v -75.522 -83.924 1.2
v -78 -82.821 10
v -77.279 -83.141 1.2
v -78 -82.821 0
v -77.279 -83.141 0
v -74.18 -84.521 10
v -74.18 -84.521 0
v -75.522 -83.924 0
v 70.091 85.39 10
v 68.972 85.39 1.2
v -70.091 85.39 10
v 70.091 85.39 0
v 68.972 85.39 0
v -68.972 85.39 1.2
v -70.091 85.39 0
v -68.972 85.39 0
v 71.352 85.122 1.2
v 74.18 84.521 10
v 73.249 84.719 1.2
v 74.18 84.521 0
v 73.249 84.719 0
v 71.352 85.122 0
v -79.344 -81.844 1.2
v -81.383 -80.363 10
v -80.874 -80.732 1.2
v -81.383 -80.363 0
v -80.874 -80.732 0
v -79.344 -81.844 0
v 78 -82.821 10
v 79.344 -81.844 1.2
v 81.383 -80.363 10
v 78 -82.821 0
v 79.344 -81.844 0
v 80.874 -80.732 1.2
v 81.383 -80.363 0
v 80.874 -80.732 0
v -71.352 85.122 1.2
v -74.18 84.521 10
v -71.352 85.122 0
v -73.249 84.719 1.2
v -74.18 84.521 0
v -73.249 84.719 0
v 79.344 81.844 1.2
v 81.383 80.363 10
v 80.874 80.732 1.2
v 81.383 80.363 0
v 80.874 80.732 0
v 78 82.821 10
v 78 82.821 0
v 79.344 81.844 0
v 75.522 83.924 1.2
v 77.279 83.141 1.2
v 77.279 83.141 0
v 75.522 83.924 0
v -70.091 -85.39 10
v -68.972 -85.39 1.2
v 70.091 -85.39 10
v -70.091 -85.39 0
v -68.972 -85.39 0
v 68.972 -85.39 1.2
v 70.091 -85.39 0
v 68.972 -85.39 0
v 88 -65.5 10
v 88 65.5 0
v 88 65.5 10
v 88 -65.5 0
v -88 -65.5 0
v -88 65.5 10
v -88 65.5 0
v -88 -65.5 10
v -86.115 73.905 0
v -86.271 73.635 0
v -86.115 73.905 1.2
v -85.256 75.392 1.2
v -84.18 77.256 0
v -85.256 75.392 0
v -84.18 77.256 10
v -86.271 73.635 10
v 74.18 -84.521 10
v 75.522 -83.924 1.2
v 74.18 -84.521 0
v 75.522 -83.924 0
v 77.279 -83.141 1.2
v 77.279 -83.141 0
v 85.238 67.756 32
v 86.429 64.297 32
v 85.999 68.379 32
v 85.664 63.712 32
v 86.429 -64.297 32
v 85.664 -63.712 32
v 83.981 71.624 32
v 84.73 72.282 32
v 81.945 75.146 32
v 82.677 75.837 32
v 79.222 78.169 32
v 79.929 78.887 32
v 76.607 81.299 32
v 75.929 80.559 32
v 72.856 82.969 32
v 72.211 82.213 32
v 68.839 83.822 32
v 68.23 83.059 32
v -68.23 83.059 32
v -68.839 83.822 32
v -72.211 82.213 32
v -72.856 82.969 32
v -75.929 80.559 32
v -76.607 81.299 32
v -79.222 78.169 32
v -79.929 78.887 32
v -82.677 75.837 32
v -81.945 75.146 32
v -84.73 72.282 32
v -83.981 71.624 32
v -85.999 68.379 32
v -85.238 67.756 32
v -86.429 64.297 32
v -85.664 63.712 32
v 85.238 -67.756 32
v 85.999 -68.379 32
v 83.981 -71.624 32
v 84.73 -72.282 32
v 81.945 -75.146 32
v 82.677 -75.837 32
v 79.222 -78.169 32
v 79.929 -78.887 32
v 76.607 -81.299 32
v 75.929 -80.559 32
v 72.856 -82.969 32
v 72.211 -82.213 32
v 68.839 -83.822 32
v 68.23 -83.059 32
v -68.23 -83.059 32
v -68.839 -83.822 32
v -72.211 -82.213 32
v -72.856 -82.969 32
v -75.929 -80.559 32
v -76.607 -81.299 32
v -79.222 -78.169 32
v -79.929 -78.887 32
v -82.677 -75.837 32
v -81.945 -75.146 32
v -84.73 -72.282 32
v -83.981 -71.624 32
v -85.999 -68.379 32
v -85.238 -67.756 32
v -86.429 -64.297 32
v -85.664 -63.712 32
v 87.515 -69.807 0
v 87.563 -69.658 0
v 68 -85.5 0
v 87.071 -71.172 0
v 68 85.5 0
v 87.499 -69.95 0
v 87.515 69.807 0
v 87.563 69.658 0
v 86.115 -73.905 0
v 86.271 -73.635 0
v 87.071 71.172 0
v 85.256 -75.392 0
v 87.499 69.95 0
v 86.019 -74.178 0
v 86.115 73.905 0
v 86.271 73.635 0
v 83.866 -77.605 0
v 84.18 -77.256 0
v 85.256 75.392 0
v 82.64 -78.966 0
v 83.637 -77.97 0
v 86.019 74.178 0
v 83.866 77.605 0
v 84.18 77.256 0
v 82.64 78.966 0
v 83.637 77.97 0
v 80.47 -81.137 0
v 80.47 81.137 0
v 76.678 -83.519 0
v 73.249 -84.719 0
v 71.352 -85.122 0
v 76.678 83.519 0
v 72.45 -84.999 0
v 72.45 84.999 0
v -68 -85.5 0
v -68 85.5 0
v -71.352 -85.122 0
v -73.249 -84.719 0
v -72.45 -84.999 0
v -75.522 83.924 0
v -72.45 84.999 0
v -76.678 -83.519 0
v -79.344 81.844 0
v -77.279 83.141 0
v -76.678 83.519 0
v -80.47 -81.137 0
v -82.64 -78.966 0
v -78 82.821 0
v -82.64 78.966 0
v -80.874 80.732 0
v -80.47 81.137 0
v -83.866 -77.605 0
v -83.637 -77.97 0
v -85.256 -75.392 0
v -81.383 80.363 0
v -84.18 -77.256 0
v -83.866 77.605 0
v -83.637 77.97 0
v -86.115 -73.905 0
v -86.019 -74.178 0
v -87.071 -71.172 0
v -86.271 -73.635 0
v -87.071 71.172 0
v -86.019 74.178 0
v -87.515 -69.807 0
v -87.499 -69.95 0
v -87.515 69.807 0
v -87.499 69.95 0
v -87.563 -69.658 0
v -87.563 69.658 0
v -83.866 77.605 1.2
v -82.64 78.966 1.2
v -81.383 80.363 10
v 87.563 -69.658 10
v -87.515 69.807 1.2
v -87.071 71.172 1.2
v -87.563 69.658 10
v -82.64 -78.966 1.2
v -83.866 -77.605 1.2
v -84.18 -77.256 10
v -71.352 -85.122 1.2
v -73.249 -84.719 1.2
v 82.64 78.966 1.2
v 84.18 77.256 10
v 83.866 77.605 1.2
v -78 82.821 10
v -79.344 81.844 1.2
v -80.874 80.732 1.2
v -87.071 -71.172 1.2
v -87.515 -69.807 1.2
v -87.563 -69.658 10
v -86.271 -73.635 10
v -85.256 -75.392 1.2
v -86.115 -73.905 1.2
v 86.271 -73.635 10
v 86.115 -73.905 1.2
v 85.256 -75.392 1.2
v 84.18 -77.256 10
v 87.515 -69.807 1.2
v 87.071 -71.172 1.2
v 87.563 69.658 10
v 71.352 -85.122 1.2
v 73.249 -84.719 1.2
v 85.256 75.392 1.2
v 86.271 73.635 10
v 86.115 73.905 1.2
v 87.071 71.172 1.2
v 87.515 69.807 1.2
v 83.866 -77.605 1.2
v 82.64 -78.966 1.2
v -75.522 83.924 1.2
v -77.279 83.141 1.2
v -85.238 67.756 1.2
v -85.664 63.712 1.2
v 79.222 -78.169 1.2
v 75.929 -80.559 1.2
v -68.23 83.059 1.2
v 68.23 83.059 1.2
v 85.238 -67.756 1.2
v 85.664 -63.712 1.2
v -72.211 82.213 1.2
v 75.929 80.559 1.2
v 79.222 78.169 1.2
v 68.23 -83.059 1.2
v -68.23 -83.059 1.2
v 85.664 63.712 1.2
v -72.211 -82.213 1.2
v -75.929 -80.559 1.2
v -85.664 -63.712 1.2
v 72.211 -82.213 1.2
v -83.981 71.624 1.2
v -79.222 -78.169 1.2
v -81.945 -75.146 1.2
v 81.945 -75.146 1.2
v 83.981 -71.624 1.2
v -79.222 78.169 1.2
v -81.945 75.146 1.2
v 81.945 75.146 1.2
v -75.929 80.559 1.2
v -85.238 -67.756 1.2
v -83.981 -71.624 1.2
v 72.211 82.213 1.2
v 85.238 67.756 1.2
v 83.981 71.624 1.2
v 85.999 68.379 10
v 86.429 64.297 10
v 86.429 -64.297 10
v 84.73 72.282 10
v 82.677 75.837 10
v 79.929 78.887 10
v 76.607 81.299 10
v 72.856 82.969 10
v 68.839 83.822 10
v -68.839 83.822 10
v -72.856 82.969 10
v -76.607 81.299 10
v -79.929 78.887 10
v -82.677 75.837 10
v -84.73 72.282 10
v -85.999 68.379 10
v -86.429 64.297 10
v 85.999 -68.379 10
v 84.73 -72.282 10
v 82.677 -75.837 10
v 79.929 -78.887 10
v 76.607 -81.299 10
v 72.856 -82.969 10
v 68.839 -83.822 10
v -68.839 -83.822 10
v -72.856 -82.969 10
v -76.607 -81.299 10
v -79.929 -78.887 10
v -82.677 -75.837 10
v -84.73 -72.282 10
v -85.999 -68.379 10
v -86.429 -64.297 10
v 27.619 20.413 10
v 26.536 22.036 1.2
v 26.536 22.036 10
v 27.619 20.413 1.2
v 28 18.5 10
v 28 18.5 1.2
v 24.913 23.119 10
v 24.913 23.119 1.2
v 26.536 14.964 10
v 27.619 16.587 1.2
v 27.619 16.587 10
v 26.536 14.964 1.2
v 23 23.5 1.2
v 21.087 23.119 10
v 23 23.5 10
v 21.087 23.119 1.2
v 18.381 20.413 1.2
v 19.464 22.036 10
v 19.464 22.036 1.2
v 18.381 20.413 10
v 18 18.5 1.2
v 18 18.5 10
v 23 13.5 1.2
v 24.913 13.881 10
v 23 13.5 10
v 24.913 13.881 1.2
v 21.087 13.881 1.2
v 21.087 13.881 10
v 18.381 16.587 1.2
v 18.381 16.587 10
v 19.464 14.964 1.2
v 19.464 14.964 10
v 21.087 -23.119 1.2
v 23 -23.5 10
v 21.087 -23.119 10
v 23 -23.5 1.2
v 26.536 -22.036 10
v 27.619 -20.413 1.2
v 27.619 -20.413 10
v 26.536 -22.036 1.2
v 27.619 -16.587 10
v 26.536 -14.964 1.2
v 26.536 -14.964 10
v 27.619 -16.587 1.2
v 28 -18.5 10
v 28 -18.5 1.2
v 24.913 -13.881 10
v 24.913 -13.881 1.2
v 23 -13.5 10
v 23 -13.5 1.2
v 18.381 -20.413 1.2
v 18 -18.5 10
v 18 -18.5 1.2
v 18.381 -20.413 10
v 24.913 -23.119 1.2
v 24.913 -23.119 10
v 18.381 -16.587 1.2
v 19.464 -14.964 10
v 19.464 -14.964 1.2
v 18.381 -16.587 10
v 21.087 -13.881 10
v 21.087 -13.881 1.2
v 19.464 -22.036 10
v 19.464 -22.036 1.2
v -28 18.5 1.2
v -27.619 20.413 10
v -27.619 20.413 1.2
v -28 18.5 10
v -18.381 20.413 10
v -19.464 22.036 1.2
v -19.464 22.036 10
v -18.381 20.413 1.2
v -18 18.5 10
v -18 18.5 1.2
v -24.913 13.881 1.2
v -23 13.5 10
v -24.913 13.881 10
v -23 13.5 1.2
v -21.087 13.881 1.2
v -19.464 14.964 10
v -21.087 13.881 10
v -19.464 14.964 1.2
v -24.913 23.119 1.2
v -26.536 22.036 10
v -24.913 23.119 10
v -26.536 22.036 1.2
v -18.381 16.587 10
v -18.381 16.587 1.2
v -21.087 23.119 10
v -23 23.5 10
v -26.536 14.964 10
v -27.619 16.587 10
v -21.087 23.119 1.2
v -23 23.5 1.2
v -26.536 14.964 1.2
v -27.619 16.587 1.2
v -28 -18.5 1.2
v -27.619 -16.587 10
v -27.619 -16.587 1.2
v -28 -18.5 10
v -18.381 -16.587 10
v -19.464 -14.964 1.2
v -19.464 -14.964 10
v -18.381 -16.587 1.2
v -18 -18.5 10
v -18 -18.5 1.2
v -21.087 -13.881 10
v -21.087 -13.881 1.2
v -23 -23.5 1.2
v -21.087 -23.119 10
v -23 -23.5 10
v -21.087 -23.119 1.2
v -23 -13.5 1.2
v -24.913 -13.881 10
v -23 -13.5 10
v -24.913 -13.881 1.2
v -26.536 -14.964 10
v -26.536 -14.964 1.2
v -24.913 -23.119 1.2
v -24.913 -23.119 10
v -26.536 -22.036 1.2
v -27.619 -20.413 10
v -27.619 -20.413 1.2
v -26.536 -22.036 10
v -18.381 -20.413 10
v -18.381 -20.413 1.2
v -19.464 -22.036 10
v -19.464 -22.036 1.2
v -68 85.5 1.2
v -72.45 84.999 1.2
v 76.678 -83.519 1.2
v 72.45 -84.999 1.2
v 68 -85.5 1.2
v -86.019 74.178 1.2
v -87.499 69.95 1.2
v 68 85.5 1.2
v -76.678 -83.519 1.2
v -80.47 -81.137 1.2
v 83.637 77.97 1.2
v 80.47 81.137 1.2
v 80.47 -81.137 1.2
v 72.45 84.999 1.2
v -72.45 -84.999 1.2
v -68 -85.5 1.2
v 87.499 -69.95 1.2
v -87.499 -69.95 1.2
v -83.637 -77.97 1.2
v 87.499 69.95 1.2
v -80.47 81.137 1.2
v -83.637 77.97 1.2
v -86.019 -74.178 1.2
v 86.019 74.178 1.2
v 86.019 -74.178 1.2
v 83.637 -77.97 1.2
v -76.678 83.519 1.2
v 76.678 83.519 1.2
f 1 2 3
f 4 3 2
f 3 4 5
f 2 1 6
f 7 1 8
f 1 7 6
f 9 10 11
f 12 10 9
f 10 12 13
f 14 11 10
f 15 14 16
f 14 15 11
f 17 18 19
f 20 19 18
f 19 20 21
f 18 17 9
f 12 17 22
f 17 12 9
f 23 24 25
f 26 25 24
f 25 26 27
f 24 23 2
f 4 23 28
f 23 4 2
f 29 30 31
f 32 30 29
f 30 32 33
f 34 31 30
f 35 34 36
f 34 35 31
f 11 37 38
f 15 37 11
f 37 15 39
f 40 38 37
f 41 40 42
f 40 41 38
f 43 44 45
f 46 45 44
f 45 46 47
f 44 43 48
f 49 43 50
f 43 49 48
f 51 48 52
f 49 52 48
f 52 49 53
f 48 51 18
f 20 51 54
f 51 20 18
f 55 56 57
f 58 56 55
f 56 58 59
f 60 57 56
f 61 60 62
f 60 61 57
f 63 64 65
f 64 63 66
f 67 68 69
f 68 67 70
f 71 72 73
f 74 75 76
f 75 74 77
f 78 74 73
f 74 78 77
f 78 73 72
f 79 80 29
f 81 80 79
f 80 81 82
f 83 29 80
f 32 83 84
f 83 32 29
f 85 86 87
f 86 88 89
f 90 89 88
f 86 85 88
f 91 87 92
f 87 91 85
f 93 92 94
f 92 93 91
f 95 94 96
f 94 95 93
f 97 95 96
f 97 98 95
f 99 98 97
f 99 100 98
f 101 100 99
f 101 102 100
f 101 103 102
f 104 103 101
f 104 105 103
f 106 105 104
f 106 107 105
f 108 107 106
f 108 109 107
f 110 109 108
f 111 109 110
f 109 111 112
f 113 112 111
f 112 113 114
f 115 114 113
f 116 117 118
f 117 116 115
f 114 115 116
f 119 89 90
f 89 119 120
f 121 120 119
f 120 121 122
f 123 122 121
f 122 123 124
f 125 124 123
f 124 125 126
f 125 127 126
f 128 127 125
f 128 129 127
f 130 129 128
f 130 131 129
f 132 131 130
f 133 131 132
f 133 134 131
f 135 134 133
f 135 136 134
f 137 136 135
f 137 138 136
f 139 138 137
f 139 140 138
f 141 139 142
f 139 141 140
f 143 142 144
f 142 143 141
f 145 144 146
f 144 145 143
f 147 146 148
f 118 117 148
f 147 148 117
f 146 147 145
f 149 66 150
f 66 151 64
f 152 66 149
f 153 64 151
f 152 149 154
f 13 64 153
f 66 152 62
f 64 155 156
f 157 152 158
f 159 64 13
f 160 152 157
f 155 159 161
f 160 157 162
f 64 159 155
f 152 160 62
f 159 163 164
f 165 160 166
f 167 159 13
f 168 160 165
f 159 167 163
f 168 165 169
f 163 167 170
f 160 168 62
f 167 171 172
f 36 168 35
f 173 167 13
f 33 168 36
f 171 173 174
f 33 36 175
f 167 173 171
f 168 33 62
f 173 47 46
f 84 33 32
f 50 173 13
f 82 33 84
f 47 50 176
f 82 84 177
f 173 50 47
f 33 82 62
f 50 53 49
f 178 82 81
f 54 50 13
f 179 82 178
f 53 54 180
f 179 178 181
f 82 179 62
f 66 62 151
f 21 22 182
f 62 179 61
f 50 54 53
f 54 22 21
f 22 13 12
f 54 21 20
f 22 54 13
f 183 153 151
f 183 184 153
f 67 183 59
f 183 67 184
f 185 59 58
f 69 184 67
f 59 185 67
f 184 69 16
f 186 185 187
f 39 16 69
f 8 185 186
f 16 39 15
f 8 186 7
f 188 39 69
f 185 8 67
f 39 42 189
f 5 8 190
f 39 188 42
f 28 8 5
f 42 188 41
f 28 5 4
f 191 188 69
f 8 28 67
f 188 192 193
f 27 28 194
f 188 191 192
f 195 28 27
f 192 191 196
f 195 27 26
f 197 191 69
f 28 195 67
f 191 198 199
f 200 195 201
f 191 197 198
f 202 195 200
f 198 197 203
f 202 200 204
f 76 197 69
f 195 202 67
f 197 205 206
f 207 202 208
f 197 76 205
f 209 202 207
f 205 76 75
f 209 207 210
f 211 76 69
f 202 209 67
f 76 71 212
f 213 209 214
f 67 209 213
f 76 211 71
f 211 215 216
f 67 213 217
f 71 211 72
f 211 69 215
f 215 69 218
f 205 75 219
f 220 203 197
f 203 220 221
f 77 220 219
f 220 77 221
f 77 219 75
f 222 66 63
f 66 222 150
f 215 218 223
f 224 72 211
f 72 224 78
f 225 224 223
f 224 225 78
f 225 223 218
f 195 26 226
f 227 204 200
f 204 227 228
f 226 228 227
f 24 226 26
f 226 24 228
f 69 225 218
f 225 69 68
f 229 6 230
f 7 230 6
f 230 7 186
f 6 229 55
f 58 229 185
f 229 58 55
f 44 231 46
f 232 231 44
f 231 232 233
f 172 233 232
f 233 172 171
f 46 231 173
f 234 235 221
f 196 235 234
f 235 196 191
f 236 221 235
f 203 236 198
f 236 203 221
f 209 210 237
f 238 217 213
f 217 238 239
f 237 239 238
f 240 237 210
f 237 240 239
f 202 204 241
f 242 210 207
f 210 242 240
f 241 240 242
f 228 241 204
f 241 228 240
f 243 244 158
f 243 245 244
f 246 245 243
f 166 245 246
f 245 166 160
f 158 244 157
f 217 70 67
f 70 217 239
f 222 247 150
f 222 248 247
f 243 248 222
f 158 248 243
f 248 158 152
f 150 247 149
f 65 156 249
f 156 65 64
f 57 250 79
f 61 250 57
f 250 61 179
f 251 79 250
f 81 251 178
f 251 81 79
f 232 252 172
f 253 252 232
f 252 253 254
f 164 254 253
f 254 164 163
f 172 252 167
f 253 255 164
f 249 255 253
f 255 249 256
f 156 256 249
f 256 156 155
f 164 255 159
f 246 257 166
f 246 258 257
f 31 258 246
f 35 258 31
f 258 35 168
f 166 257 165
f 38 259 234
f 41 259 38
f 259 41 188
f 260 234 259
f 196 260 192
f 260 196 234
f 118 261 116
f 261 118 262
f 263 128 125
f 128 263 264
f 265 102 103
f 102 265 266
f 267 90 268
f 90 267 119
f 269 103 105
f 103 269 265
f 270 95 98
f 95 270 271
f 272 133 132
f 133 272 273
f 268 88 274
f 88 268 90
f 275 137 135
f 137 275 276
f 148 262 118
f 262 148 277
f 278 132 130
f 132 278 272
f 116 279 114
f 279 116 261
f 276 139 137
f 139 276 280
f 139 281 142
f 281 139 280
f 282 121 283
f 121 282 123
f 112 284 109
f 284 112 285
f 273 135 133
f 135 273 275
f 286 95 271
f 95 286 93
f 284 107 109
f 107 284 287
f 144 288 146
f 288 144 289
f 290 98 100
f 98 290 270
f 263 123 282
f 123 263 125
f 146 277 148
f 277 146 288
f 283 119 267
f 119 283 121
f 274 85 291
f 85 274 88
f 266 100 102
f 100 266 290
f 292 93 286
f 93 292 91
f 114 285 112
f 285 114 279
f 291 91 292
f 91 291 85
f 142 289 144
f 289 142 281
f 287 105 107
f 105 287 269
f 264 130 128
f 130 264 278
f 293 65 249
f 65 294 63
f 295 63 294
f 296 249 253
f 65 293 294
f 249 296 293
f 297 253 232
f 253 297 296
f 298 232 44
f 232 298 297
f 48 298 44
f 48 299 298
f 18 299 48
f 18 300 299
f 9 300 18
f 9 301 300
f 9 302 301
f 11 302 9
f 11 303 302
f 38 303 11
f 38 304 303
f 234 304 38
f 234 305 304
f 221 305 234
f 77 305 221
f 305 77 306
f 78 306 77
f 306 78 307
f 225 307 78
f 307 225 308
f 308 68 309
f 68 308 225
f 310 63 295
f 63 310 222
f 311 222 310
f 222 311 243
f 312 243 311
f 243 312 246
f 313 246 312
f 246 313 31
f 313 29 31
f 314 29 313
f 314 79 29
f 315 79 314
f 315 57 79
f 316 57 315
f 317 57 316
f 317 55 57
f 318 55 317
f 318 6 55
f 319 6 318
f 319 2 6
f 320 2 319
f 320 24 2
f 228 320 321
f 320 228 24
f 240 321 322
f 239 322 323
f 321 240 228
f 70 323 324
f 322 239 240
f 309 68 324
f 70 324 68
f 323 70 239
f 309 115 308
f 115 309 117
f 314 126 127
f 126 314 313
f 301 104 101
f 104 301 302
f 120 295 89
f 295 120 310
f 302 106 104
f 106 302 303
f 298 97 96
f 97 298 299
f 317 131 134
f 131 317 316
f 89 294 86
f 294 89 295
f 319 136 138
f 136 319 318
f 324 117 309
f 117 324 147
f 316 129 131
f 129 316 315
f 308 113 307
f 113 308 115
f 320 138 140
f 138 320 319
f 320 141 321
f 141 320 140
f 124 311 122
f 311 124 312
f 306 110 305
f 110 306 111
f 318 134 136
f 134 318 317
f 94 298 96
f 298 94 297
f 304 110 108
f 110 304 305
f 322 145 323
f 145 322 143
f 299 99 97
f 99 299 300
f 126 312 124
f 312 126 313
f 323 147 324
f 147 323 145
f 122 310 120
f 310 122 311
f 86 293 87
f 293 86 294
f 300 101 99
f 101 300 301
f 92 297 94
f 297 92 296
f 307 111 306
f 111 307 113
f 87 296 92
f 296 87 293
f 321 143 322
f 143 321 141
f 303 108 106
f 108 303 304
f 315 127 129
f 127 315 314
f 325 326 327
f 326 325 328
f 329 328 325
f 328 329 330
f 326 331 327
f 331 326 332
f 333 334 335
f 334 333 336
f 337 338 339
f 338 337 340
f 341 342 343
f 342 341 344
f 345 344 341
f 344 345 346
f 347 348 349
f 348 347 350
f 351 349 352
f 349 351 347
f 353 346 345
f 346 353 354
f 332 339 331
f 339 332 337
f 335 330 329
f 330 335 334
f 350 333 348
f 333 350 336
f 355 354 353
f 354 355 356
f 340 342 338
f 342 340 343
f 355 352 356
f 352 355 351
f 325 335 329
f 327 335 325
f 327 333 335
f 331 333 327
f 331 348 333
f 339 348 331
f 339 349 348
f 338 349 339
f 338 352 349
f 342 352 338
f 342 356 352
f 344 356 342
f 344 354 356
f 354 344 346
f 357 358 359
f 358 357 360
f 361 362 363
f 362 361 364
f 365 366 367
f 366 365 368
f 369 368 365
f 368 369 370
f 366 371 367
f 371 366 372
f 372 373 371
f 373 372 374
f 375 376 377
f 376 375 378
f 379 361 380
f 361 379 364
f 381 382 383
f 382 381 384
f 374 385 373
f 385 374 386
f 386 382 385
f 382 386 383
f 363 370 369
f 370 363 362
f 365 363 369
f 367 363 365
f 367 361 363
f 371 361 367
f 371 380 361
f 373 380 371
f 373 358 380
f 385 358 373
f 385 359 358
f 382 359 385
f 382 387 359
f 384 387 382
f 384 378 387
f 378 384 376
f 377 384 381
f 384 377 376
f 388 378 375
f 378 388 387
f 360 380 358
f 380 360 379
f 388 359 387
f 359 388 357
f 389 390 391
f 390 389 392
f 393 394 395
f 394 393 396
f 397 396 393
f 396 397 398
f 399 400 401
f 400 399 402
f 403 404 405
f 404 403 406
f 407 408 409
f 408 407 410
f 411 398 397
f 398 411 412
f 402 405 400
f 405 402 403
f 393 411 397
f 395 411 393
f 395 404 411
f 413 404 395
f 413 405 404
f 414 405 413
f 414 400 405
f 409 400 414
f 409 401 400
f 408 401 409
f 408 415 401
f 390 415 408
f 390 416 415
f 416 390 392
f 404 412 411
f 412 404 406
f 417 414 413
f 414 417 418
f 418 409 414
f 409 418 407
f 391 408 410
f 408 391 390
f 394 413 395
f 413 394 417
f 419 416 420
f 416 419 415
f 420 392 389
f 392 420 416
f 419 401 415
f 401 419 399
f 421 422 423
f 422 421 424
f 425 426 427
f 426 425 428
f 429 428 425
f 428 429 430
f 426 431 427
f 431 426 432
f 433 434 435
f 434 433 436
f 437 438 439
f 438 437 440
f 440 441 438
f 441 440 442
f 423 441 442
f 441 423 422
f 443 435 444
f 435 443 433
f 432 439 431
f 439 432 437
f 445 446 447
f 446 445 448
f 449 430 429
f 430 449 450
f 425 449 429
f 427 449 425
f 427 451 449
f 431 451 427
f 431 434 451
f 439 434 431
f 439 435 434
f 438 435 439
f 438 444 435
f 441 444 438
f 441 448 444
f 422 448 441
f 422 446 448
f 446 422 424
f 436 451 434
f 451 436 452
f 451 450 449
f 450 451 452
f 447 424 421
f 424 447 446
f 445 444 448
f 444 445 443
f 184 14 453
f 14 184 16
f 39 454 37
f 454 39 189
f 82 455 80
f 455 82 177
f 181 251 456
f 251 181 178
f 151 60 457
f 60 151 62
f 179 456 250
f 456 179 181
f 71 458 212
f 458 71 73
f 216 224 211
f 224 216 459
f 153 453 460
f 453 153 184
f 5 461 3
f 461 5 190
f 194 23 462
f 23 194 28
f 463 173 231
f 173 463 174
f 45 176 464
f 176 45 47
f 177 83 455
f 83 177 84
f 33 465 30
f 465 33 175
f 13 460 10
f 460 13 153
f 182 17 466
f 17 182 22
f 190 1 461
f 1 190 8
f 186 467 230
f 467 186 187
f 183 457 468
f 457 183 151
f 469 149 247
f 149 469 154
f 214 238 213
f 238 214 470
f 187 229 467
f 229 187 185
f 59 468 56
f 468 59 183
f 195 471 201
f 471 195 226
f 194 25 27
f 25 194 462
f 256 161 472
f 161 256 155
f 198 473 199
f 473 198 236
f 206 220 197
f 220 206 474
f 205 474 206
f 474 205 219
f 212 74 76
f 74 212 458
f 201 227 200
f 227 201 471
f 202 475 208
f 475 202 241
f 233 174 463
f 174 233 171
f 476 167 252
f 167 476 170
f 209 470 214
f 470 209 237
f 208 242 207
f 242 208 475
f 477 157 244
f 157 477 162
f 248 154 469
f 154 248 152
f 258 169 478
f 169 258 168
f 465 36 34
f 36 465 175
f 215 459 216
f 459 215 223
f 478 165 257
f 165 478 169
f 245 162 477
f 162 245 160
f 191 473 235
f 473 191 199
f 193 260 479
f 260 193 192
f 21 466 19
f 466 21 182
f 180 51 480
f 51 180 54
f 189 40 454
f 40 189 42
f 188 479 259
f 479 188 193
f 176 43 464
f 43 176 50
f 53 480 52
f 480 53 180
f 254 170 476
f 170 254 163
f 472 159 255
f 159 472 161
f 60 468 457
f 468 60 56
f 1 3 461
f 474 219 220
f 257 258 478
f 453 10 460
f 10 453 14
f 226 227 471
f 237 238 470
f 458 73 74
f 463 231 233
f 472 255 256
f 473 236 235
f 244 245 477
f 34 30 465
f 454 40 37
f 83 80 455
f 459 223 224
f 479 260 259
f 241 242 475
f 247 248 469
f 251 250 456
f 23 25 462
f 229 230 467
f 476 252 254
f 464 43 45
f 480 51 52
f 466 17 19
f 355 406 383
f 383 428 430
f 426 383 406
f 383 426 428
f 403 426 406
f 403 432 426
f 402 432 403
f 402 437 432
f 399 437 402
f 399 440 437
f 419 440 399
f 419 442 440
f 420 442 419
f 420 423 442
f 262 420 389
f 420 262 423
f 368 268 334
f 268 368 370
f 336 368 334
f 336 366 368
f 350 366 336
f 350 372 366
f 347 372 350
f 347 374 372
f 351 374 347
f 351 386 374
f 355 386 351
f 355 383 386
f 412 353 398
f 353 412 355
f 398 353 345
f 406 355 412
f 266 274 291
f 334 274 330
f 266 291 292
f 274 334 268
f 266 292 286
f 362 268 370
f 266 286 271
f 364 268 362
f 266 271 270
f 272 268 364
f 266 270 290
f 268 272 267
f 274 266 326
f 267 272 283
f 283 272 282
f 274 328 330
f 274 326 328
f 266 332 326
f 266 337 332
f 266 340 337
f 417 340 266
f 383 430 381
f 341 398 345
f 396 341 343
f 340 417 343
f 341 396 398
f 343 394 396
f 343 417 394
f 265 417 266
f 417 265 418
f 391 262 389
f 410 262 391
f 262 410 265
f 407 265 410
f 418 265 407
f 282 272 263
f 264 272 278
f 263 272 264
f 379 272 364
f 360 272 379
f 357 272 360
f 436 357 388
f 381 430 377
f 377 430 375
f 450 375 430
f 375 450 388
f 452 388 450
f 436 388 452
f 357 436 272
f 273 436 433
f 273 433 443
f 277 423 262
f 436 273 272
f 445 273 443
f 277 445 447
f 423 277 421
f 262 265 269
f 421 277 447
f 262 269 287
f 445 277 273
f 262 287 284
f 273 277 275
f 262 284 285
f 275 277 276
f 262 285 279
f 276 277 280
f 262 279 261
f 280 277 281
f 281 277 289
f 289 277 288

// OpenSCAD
bot_h = 25;

core_w = 32;
height = 32;
props_r = 38;
space_x = 110 - 10;
space_y = 85 + 10;

corner_r = 20;
corner_a = 90;

thickness = 1.2;

total_width = props_r * 2 + space_x;
total_height = props_r * 2 + space_y;

echo("total_width: ", total_width);
echo("total_height: ", total_height);

module box() {
  translate([-space_x / 2, -space_y / 2, 0]) {
    hull() {
      translate([0, 0, 0]) {
        cylinder(h = height, r = props_r);
        translate([-props_r + corner_r, -props_r + corner_r, 0]) {
          cylinder(h = height, r = corner_r);
        }
      }
      translate([space_x, 0, 0]) {
        cylinder(h = height, r = props_r);
        translate([props_r - corner_r, -props_r + corner_r, 0]) {
          cylinder(h = height, r = corner_r);
        }
      }
      translate([0, space_y, 0]) {
        cylinder(h = height, r = props_r);
        translate([-props_r + corner_r, props_r - corner_r, 0]) {
          cylinder(h = height, r = corner_r);
        }
      }
      translate([space_x, space_y, 0]) {
        cylinder(h = height, r = props_r);
        translate([props_r - corner_r, props_r - corner_r, 0]) {
          cylinder(h = height, r = corner_r);
        }
      }
    }
  }
}

module open_box(t = 1) {
  x_factor = (total_width * 100) / (total_width + t * 2) / 100;
  y_factor = (total_height * 100) / (total_height + t * 2) / 100;

  echo("x_factor: ", x_factor);
  echo("y_factor: ", y_factor);

  difference() {
    box();
    scale([x_factor, y_factor, 1]) {
      box();
    }
  }
}

module pieEdge(a, r, h, rot = 0) {
  difference() {
    pieSlice(a, r, h, rot);
    cylinder(h = h, r = r - 1);
  }
}

module pieSlice(a, r, h, rot = 0) {
  // a:angle, r:radius, h:height
  rotate(rot, [0, 0, 1]) {
    rotate_extrude(angle = a) {
      square([r, h]);
    }
  }
}

module core() {
  core_lock_r = 7;
  core_lock_h = 10;
  enforcer_shift = 20;
  core_lock2_r = 3;

  translate([-core_w / 2, -total_height / 2 + thickness, 0]) {
    cube([core_w, total_height - thickness - 55, thickness]);
  }

  module backtocenter() {
    translate([space_x / 2, space_y / 2, 0]) {
      cylinder(h = thickness, r = 5);
    }
  }
  cylinder(h = thickness, r = core_w / 2);
  cylinder(h = core_lock_h, r = core_lock_r);
  translate([0, 24, 0]) {
    cylinder(h = core_lock_h, r = core_lock2_r);
  }
  translate([0, -24, 0]) {
    cylinder(h = core_lock_h, r = core_lock2_r);
  }
  translate([-space_x / 2, -space_y / 2, 0]) {
    hull() {
      translate([0, -enforcer_shift, 0]) {
        backtocenter();
      }
      translate([space_x, 0, 0]) {
        translate([props_r - corner_r, -props_r + corner_r, 0]) {
          pieEdge(a = corner_a, rot = 270 + (90 - corner_a) / 2, h = thickness, r = corner_r);
        }
      }
      // }
      // hull() {
      translate([0, -enforcer_shift, 0]) {
        backtocenter();
      }
      translate([0, 0, 0]) {
        translate([-props_r + corner_r, -props_r + corner_r, 0]) {
          pieEdge(a = corner_a, rot = 180 + (90 - corner_a) / 2, h = thickness, r = corner_r);
        }
      }
      // }
      // hull() {
      translate([0, enforcer_shift, 0]) {
        backtocenter();
      }
      translate([0, space_y, 0]) {
        translate([-props_r + corner_r, props_r - corner_r, 0]) {
          pieEdge(a = corner_a, rot = 90 + (90 - corner_a) / 2, h = thickness, r = corner_r);
        }
      }
      // }
      // hull() {
      translate([0, enforcer_shift, 0]) {
        backtocenter();
      }
      translate([space_x, space_y, 0]) {
        translate([props_r - corner_r, props_r - corner_r, 0]) {
          pieEdge(a = corner_a, rot = 0 + (90 - corner_a) / 2, h = thickness, r = corner_r);
        }
      }
    }
  }
}

module core_bot() {
  core_lock_r = 5;
  core_lock_h = 10;
  shift1 = 46 / 2;
  shift2 = 37 / 2;

  translate([shift1, shift2, 0]) {
    cylinder(h = core_lock_h, r = core_lock_r);
  }
  translate([shift1, -shift2, 0]) {
    cylinder(h = core_lock_h, r = core_lock_r);
  }
  translate([-shift1, shift2, 0]) {
    cylinder(h = core_lock_h, r = core_lock_r);
  }
  translate([-shift1, -shift2, 0]) {
    cylinder(h = core_lock_h, r = core_lock_r);
  }

  // dowyjebbania
  // translate([-space_x / 2, -space_y / 2, 0]) {
  //   hull() {
  //     translate([space_x, 0, 0]) {
  //       translate([props_r - corner_r, -props_r + corner_r, 0]) {
  //         pieEdge(a = corner_a, rot = 270 + (90 - corner_a) / 2, h = thickness, r = corner_r);
  //       }
  //     }
  //     translate([space_x / 2, space_y / 2, 0]) {
  //       translate([-shift1, shift2, 0]) {
  //         cylinder(h = 1, r = core_lock_r);
  //       }
  //     }
  //   }
  //   hull() {
  //     translate([0, 0, 0]) {
  //       translate([-props_r + corner_r, -props_r + corner_r, 0]) {
  //         pieEdge(a = corner_a, rot = 180 + (90 - corner_a) / 2, h = thickness, r = corner_r);
  //       }
  //     }
  //     translate([space_x / 2, space_y / 2, 0]) {
  //       translate([shift1, shift2, 0]) {
  //         cylinder(h = 1, r = core_lock_r);
  //       }
  //     }
  //   }
  //   hull() {
  //     translate([0, space_y, 0]) {
  //       translate([-props_r + corner_r, props_r - corner_r, 0]) {
  //         pieEdge(a = corner_a, rot = 90 + (90 - corner_a) / 2, h = thickness, r = corner_r);
  //       }
  //     }
  //     translate([space_x / 2, space_y / 2, 0]) {
  //       translate([shift1, -shift2, 0]) {
  //         cylinder(h = 1, r = core_lock_r);
  //       }
  //     }
  //   }
  //   hull() {
  //     translate([space_x, space_y, 0]) {
  //       translate([props_r - corner_r, props_r - corner_r, 0]) {
  //         pieEdge(a = corner_a, rot = 0 + (90 - corner_a) / 2, h = thickness, r = corner_r);
  //       }
  //     }
  //     translate([space_x / 2, space_y / 2, 0]) {
  //       translate([-shift1, -shift2, 0]) {
  //         cylinder(h = 1, r = core_lock_r);
  //       }
  //     }
  //   }
  // }

  // REAL BOTTOM
  translate([-space_x / 2, -space_y / 2, 0]) {
    hull() {
      translate([space_x, 0, 0]) {
        translate([props_r - corner_r, -props_r + corner_r, 0]) {
          pieEdge(a = corner_a, rot = 270 + (90 - corner_a) / 2, h = thickness, r = corner_r);
        }
      }
      translate([0, 0, 0]) {
        translate([-props_r + corner_r, -props_r + corner_r, 0]) {
          pieEdge(a = corner_a, rot = 180 + (90 - corner_a) / 2, h = thickness, r = corner_r);
        }
      }
      translate([0, space_y, 0]) {
        translate([-props_r + corner_r, props_r - corner_r, 0]) {
          pieEdge(a = corner_a, rot = 90 + (90 - corner_a) / 2, h = thickness, r = corner_r);
        }
      }
      translate([space_x, space_y, 0]) {
        translate([props_r - corner_r, props_r - corner_r, 0]) {
          pieEdge(a = corner_a, rot = 0 + (90 - corner_a) / 2, h = thickness, r = corner_r);
        }
      }
    }
  }
}

module box_bot() {
  bot_t = thickness + 1.2;
  difference() {
    open_box(bot_t);
    translate([0, 0, 10]) {
      open_box(thickness + 0.4);
    }
  }
}

render() {
  box_bot();
  core_bot();
}

// Top
// render() {
//   core();
//   open_box(thickness);
// }
